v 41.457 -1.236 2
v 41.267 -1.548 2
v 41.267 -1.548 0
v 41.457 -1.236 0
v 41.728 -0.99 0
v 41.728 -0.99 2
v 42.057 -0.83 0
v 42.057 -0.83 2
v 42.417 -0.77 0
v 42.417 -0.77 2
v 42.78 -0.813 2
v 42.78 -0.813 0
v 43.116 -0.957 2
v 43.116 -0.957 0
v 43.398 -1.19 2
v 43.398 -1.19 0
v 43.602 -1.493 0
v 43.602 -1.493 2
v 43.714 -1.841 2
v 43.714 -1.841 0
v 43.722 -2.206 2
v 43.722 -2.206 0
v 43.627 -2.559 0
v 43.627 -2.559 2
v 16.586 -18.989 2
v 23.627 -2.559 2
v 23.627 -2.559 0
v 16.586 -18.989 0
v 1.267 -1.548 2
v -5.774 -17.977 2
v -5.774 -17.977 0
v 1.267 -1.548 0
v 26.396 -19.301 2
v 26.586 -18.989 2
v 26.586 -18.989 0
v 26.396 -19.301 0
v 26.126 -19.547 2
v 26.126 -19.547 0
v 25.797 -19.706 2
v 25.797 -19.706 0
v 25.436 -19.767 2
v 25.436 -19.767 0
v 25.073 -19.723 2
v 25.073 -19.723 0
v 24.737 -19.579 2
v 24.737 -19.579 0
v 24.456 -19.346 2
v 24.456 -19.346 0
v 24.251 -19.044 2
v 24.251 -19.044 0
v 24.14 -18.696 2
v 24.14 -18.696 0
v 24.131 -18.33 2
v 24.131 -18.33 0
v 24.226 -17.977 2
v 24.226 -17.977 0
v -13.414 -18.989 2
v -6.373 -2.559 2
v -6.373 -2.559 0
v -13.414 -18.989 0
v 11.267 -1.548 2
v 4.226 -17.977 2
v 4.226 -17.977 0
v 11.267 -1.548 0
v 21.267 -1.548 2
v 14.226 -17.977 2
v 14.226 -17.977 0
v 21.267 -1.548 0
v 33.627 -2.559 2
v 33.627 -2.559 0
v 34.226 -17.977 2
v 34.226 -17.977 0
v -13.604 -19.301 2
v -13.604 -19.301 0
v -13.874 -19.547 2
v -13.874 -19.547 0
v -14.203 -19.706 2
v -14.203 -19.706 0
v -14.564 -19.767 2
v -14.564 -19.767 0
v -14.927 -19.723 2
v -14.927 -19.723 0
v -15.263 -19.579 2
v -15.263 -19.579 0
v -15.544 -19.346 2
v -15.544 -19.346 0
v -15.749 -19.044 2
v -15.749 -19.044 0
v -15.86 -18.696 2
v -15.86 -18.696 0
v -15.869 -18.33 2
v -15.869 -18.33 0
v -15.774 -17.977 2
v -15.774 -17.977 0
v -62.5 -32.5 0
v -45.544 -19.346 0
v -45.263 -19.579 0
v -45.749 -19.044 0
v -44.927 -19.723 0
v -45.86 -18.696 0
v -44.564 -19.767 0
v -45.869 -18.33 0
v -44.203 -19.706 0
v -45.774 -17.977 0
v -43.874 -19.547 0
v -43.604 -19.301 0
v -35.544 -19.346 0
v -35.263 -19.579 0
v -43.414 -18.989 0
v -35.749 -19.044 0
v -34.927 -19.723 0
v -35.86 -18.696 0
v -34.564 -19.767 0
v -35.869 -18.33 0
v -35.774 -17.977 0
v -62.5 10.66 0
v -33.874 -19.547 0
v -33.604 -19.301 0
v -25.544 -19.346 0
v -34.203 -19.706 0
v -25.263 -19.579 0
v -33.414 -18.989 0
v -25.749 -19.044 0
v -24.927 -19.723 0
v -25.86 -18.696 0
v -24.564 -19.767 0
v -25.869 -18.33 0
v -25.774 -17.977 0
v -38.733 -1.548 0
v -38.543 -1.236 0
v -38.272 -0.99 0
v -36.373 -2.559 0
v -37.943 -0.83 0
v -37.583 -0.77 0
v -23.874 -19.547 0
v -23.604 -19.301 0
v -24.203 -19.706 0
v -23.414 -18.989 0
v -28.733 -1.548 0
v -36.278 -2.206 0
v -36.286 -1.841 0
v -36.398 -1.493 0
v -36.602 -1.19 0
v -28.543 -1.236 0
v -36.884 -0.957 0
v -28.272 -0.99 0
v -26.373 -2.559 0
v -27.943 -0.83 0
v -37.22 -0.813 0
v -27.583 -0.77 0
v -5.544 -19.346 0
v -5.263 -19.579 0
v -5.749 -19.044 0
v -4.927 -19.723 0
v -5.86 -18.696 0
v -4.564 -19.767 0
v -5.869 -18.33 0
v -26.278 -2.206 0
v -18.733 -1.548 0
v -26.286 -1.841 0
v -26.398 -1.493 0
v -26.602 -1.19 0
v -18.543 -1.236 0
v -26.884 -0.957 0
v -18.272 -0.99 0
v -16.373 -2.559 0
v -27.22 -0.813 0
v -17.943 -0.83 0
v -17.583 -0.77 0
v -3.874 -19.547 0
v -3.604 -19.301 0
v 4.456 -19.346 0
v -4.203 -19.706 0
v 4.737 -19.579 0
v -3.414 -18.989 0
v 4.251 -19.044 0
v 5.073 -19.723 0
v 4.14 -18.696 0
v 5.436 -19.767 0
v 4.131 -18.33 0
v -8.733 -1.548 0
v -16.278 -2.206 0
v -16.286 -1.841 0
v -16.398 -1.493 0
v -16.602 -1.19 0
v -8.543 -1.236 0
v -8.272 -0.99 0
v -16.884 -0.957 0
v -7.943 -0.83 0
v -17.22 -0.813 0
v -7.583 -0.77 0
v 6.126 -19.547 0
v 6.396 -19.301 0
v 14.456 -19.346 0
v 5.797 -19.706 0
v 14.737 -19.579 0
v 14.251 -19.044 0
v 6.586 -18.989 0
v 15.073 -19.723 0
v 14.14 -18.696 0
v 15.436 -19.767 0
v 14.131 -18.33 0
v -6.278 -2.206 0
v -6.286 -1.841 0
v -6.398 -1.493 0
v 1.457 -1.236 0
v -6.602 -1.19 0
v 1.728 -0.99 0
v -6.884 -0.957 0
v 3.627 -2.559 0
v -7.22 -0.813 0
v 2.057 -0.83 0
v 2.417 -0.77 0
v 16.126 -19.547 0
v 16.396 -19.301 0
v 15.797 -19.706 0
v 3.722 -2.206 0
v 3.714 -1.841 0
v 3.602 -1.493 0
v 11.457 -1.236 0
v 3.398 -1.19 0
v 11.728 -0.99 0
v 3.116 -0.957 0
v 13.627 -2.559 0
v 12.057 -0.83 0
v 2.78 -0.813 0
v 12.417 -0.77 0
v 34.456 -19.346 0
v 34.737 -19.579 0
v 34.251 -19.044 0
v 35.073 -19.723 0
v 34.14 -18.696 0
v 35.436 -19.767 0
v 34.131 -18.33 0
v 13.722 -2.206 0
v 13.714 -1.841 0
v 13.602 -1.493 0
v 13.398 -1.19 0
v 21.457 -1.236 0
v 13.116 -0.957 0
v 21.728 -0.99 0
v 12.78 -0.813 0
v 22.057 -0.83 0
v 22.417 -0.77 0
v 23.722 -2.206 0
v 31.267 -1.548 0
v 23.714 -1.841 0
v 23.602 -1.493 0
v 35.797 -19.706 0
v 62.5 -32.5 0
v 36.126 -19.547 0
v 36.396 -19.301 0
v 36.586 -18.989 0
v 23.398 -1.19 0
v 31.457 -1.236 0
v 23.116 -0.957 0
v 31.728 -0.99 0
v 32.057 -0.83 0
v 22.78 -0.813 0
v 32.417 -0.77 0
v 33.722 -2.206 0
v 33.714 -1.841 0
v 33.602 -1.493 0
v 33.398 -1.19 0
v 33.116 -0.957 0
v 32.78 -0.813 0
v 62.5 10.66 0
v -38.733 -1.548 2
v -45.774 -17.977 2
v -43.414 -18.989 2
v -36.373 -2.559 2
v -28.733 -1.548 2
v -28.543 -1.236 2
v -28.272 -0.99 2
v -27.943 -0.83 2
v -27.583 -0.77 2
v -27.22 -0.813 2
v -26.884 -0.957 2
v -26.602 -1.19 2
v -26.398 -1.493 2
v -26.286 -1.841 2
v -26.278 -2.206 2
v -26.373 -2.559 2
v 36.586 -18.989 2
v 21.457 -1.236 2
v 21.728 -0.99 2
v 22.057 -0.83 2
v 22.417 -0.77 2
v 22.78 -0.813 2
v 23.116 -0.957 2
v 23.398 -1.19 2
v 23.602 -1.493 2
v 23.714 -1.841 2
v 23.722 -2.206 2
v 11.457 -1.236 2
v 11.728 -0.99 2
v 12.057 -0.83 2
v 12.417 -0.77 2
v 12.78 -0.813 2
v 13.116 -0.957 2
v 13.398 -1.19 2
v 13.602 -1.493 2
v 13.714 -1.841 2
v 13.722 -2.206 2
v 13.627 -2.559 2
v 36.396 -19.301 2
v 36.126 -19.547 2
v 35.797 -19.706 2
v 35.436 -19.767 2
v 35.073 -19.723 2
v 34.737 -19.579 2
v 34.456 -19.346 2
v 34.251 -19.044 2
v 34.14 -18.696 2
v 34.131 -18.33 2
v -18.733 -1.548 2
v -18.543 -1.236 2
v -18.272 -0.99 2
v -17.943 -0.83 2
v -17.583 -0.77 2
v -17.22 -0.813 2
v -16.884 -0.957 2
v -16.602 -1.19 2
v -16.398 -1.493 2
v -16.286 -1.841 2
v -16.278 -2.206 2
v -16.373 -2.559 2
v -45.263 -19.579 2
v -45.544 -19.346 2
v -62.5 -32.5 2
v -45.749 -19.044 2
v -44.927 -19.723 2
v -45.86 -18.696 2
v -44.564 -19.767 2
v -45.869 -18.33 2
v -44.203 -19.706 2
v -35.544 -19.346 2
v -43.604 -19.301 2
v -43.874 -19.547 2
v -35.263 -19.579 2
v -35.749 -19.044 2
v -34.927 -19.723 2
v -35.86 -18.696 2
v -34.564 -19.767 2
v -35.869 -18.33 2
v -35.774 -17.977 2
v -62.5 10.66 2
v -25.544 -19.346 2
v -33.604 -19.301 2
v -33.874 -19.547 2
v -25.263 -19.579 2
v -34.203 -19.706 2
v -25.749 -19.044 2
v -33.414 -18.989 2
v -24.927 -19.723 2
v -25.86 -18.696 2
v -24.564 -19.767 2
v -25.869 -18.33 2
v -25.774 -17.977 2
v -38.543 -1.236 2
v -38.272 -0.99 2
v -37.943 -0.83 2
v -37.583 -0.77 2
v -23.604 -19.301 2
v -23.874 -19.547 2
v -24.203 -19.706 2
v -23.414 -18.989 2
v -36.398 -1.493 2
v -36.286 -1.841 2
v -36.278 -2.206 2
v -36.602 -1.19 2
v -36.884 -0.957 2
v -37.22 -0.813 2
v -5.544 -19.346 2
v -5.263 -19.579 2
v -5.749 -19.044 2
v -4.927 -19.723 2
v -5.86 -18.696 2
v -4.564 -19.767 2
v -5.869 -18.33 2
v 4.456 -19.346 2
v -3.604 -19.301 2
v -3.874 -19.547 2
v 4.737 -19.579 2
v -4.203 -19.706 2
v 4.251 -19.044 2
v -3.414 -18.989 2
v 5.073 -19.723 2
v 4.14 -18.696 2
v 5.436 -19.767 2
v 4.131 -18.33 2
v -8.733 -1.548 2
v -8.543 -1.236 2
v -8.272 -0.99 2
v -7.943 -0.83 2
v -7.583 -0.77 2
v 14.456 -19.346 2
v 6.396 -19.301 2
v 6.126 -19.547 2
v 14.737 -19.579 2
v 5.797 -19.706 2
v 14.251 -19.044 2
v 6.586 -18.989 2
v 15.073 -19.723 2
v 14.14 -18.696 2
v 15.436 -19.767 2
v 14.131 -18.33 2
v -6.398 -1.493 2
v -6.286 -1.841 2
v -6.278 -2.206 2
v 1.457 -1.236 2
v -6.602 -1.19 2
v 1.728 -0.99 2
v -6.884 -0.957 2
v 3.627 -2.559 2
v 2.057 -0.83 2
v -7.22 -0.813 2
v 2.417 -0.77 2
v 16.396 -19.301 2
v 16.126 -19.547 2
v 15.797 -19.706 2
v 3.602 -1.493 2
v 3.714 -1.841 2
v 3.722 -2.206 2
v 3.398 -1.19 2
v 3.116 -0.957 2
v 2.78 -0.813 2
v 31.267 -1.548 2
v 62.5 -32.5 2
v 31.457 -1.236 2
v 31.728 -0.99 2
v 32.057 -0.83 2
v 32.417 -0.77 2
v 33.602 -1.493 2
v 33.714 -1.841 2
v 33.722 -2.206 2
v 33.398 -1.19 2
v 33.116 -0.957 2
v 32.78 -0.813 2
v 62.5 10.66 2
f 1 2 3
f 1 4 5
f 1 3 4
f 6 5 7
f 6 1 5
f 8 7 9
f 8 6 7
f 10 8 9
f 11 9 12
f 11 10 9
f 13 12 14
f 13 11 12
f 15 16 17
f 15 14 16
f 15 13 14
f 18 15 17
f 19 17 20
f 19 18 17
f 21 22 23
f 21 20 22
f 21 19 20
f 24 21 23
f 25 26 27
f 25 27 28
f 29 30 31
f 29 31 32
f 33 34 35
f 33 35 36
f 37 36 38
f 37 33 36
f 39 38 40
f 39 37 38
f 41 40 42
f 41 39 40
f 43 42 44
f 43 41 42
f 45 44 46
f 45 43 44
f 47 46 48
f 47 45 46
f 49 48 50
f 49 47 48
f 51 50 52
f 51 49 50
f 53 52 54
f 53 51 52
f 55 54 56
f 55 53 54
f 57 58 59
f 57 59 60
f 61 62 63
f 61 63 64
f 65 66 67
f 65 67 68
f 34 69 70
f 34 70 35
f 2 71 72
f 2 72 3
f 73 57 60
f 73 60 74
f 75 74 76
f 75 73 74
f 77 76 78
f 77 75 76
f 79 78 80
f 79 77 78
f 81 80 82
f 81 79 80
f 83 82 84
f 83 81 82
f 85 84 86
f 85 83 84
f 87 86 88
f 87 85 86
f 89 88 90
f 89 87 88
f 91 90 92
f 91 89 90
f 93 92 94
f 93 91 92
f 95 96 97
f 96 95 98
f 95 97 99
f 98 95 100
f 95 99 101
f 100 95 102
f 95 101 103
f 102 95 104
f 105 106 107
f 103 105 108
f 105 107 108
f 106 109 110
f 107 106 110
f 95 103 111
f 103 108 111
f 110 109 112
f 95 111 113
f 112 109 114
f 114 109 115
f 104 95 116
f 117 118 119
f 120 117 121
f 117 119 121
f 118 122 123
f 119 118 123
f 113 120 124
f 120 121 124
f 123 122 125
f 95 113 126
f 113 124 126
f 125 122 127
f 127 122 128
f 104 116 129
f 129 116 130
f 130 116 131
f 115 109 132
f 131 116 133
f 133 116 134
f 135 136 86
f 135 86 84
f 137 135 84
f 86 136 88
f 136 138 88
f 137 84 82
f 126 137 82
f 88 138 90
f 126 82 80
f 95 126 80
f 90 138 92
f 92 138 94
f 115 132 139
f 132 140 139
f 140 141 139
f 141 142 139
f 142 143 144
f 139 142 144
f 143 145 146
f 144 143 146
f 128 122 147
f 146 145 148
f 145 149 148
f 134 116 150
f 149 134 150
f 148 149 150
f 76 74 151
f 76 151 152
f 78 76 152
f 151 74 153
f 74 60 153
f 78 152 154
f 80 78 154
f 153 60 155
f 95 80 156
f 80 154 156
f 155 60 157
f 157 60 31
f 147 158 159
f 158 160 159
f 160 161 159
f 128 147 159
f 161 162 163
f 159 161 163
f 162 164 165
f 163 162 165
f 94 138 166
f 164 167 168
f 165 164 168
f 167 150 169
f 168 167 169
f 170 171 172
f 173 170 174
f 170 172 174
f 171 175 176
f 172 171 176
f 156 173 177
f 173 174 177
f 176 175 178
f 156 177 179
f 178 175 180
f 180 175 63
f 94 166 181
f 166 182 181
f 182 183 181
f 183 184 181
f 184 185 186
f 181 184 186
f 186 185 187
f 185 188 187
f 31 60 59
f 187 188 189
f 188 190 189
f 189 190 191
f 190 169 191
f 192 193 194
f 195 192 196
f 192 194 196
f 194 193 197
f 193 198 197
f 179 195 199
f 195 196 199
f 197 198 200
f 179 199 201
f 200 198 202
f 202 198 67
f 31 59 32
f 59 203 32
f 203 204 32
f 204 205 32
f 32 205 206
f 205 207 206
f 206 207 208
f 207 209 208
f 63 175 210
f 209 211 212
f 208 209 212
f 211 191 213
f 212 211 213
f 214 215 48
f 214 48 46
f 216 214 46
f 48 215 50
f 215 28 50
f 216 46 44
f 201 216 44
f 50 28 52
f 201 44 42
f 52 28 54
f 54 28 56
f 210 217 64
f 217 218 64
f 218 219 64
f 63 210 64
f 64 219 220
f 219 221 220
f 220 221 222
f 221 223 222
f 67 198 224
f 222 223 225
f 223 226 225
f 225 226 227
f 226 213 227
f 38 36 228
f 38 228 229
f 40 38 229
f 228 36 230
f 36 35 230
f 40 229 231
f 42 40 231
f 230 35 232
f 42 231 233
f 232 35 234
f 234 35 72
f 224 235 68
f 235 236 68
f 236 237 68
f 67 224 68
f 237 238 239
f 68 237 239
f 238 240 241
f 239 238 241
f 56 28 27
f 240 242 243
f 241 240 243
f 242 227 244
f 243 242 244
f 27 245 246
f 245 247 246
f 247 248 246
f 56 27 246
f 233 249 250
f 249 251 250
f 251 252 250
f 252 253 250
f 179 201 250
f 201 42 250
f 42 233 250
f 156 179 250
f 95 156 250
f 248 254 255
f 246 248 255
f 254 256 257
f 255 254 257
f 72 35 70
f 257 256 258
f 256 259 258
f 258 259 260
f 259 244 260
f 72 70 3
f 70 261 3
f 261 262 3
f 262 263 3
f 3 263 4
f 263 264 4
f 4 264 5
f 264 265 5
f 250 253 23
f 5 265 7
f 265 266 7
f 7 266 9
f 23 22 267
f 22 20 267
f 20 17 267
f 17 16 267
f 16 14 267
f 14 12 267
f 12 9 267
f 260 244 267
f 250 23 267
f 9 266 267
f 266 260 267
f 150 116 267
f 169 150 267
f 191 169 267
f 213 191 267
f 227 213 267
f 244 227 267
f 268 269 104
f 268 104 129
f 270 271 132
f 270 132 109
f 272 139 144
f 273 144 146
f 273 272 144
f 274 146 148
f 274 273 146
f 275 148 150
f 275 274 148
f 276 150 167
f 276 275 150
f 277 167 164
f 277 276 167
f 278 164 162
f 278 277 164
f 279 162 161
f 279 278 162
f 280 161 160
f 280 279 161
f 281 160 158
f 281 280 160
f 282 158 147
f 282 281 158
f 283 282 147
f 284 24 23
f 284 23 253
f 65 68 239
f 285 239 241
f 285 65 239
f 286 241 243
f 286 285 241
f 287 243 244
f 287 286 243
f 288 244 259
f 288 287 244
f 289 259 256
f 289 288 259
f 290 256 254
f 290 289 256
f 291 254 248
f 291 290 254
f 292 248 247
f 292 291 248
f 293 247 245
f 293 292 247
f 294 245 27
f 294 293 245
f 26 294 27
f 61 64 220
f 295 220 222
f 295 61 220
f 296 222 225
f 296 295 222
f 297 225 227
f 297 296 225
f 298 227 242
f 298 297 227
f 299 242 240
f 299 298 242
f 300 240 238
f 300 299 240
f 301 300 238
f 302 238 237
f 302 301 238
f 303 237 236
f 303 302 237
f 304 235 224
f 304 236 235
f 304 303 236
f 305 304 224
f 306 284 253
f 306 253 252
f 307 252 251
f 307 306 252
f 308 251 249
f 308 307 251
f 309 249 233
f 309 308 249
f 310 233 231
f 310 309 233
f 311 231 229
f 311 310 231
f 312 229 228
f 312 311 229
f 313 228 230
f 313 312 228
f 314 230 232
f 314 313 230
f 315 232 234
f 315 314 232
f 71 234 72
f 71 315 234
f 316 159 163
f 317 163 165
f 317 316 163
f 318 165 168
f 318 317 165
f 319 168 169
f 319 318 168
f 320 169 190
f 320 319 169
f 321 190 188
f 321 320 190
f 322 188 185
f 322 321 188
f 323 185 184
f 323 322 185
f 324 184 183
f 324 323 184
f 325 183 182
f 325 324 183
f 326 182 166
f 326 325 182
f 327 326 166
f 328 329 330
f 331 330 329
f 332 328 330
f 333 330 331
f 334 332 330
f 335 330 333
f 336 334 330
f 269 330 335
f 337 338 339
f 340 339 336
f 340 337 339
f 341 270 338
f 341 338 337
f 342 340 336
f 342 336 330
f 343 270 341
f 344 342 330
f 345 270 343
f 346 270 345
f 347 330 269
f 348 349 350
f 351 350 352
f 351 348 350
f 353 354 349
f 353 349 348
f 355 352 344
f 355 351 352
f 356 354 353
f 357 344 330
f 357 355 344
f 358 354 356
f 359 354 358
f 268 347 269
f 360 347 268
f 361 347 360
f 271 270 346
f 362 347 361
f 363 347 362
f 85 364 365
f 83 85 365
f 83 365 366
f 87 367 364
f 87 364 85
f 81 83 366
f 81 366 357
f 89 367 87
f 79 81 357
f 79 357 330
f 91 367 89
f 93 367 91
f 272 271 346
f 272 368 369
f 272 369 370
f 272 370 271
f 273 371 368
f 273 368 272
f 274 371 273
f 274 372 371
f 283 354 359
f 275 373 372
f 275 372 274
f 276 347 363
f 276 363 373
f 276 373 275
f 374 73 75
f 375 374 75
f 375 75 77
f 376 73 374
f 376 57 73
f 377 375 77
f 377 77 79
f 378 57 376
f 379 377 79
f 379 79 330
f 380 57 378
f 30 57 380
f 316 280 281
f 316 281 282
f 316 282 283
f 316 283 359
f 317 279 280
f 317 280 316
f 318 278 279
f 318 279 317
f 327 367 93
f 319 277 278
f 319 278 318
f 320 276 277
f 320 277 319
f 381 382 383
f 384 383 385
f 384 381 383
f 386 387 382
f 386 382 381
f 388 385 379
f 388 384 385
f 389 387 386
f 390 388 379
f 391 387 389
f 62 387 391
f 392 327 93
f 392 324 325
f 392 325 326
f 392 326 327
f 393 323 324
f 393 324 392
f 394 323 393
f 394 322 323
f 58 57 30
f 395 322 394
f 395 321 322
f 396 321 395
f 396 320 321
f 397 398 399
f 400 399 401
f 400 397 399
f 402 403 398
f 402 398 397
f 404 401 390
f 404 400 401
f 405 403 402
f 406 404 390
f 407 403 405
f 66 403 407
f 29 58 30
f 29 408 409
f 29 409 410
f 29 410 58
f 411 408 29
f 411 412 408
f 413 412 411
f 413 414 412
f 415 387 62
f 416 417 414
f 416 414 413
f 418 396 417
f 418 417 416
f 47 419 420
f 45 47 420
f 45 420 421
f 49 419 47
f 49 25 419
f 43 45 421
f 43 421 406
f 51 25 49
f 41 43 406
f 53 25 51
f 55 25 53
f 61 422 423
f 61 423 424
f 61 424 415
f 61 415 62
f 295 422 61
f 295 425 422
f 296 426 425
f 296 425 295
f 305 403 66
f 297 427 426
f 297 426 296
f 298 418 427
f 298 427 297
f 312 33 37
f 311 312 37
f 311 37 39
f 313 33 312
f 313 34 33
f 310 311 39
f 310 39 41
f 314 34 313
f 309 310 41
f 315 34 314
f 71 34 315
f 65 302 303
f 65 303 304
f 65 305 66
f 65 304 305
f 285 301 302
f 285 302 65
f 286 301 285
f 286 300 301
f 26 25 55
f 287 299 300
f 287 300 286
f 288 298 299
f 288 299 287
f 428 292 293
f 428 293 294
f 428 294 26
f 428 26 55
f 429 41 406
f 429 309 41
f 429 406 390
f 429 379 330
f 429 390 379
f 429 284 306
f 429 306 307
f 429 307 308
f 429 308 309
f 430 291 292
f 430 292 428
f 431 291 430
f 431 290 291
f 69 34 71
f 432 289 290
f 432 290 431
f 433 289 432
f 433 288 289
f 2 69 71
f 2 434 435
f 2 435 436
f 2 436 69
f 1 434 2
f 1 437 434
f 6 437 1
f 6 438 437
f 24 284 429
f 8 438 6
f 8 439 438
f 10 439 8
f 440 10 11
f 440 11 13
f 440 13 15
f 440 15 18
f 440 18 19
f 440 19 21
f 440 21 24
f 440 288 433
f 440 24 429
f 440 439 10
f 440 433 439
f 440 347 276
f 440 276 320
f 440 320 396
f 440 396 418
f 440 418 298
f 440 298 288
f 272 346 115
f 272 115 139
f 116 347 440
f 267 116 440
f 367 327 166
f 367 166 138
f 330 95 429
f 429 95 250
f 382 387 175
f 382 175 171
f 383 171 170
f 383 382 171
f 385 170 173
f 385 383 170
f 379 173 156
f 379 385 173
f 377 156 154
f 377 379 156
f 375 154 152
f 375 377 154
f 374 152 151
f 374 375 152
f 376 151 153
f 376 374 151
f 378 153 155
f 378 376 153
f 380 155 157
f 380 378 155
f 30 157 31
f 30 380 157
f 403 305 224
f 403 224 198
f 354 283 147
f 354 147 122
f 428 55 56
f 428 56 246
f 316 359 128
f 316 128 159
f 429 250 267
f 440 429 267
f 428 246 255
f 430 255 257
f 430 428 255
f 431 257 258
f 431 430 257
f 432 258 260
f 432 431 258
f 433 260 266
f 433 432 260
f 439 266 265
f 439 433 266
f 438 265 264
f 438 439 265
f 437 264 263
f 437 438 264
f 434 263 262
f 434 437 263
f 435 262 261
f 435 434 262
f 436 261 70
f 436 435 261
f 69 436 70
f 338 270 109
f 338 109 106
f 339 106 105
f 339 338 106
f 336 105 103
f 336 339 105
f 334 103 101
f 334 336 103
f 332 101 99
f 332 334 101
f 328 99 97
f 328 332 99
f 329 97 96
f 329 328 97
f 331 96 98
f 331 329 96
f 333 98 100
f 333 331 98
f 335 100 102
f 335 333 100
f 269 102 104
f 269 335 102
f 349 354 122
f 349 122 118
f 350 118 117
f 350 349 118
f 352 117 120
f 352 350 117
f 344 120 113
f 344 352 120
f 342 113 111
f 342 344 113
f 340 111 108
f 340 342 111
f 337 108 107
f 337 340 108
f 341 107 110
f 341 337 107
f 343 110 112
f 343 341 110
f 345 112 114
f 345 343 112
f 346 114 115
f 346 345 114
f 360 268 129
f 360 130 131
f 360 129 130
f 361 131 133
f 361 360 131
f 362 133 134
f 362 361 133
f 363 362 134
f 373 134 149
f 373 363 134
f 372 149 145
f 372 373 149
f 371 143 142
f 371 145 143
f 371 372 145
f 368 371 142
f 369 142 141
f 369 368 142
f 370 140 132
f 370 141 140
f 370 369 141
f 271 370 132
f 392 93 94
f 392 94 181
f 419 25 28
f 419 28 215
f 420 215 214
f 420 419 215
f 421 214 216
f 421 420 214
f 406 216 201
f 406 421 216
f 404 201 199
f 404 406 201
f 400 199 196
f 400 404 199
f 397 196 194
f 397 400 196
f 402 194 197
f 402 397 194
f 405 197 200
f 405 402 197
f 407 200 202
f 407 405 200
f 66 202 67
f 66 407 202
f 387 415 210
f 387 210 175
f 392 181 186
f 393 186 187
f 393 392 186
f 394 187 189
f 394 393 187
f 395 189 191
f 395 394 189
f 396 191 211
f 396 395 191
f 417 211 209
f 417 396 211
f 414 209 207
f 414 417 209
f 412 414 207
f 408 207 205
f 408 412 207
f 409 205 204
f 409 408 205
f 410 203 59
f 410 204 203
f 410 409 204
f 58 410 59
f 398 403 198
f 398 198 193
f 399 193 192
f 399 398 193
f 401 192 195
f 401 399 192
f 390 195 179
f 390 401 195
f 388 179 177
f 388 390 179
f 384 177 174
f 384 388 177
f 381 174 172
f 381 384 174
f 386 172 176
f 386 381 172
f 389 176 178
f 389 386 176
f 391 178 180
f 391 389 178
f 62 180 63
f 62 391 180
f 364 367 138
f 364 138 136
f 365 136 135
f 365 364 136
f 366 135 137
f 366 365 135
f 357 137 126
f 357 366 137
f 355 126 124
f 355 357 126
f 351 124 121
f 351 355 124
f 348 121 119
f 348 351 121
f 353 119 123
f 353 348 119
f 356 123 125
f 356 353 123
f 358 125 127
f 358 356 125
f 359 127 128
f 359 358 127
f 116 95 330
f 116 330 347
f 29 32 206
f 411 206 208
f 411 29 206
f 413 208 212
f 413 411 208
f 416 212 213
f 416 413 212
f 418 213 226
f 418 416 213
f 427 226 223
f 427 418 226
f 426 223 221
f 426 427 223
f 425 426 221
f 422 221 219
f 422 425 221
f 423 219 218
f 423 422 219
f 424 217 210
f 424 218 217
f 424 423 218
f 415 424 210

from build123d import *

# Parameters (mm, degrees)
SKETCH1_W           = 125
SKETCH1_H           = 65
BOSS_EXTRUDE1_DEPTH = 2
SKETCH2_W           = 125
SKETCH2_H           = 21.840489908
CUT_EXTRUDE1_DEPTH  = 3
CUT_EXTRUDE2_DEPTH  = 20
LPATTERN1_COUNT     = 9
LPATTERN1_PITCH     = 10


with BuildPart() as part:
    # Sketch1 → Boss-Extrude1 (new body)
    with BuildSketch(Plane.XY):
        Rectangle(SKETCH1_W, SKETCH1_H)
    extrude(amount=BOSS_EXTRUDE1_DEPTH)

    # Sketch2 → Cut-Extrude1 (cut, through all)
    with BuildSketch(Plane.XY.offset(2)):
        with Locations((0, 21.579755046)):
            Rectangle(SKETCH2_W, SKETCH2_H)
    extrude(amount=-CUT_EXTRUDE1_DEPTH, mode=Mode.SUBTRACT)

    # Sketch3 → Cut-Extrude2 (cut)
    with BuildSketch(Plane.XY.offset(2)):
        with BuildLine():
            Line((-45.774182217, -17.977174407), (-38.733037936, -1.547837751))
            ThreePointArc((-38.733037936, -1.547837751), (-37.046940168, -0.873398644), (-36.372501061, -2.559496412))
            Line((-36.372501061, -2.559496412), (-43.413645342, -18.988833068))
            ThreePointArc((-43.413645342, -18.988833068), (-45.09974311, -19.663272175), (-45.774182217, -17.977174407))
        make_face()
    cut_extrude2 = extrude(amount=-CUT_EXTRUDE2_DEPTH, mode=Mode.SUBTRACT)

    # LPattern1: Cut-Extrude2 ×9
    with Locations(*[(i * LPATTERN1_PITCH, 0, 0) for i in range(1, LPATTERN1_COUNT)]):
        add(cut_extrude2, mode=Mode.SUBTRACT)


solid = part.part
